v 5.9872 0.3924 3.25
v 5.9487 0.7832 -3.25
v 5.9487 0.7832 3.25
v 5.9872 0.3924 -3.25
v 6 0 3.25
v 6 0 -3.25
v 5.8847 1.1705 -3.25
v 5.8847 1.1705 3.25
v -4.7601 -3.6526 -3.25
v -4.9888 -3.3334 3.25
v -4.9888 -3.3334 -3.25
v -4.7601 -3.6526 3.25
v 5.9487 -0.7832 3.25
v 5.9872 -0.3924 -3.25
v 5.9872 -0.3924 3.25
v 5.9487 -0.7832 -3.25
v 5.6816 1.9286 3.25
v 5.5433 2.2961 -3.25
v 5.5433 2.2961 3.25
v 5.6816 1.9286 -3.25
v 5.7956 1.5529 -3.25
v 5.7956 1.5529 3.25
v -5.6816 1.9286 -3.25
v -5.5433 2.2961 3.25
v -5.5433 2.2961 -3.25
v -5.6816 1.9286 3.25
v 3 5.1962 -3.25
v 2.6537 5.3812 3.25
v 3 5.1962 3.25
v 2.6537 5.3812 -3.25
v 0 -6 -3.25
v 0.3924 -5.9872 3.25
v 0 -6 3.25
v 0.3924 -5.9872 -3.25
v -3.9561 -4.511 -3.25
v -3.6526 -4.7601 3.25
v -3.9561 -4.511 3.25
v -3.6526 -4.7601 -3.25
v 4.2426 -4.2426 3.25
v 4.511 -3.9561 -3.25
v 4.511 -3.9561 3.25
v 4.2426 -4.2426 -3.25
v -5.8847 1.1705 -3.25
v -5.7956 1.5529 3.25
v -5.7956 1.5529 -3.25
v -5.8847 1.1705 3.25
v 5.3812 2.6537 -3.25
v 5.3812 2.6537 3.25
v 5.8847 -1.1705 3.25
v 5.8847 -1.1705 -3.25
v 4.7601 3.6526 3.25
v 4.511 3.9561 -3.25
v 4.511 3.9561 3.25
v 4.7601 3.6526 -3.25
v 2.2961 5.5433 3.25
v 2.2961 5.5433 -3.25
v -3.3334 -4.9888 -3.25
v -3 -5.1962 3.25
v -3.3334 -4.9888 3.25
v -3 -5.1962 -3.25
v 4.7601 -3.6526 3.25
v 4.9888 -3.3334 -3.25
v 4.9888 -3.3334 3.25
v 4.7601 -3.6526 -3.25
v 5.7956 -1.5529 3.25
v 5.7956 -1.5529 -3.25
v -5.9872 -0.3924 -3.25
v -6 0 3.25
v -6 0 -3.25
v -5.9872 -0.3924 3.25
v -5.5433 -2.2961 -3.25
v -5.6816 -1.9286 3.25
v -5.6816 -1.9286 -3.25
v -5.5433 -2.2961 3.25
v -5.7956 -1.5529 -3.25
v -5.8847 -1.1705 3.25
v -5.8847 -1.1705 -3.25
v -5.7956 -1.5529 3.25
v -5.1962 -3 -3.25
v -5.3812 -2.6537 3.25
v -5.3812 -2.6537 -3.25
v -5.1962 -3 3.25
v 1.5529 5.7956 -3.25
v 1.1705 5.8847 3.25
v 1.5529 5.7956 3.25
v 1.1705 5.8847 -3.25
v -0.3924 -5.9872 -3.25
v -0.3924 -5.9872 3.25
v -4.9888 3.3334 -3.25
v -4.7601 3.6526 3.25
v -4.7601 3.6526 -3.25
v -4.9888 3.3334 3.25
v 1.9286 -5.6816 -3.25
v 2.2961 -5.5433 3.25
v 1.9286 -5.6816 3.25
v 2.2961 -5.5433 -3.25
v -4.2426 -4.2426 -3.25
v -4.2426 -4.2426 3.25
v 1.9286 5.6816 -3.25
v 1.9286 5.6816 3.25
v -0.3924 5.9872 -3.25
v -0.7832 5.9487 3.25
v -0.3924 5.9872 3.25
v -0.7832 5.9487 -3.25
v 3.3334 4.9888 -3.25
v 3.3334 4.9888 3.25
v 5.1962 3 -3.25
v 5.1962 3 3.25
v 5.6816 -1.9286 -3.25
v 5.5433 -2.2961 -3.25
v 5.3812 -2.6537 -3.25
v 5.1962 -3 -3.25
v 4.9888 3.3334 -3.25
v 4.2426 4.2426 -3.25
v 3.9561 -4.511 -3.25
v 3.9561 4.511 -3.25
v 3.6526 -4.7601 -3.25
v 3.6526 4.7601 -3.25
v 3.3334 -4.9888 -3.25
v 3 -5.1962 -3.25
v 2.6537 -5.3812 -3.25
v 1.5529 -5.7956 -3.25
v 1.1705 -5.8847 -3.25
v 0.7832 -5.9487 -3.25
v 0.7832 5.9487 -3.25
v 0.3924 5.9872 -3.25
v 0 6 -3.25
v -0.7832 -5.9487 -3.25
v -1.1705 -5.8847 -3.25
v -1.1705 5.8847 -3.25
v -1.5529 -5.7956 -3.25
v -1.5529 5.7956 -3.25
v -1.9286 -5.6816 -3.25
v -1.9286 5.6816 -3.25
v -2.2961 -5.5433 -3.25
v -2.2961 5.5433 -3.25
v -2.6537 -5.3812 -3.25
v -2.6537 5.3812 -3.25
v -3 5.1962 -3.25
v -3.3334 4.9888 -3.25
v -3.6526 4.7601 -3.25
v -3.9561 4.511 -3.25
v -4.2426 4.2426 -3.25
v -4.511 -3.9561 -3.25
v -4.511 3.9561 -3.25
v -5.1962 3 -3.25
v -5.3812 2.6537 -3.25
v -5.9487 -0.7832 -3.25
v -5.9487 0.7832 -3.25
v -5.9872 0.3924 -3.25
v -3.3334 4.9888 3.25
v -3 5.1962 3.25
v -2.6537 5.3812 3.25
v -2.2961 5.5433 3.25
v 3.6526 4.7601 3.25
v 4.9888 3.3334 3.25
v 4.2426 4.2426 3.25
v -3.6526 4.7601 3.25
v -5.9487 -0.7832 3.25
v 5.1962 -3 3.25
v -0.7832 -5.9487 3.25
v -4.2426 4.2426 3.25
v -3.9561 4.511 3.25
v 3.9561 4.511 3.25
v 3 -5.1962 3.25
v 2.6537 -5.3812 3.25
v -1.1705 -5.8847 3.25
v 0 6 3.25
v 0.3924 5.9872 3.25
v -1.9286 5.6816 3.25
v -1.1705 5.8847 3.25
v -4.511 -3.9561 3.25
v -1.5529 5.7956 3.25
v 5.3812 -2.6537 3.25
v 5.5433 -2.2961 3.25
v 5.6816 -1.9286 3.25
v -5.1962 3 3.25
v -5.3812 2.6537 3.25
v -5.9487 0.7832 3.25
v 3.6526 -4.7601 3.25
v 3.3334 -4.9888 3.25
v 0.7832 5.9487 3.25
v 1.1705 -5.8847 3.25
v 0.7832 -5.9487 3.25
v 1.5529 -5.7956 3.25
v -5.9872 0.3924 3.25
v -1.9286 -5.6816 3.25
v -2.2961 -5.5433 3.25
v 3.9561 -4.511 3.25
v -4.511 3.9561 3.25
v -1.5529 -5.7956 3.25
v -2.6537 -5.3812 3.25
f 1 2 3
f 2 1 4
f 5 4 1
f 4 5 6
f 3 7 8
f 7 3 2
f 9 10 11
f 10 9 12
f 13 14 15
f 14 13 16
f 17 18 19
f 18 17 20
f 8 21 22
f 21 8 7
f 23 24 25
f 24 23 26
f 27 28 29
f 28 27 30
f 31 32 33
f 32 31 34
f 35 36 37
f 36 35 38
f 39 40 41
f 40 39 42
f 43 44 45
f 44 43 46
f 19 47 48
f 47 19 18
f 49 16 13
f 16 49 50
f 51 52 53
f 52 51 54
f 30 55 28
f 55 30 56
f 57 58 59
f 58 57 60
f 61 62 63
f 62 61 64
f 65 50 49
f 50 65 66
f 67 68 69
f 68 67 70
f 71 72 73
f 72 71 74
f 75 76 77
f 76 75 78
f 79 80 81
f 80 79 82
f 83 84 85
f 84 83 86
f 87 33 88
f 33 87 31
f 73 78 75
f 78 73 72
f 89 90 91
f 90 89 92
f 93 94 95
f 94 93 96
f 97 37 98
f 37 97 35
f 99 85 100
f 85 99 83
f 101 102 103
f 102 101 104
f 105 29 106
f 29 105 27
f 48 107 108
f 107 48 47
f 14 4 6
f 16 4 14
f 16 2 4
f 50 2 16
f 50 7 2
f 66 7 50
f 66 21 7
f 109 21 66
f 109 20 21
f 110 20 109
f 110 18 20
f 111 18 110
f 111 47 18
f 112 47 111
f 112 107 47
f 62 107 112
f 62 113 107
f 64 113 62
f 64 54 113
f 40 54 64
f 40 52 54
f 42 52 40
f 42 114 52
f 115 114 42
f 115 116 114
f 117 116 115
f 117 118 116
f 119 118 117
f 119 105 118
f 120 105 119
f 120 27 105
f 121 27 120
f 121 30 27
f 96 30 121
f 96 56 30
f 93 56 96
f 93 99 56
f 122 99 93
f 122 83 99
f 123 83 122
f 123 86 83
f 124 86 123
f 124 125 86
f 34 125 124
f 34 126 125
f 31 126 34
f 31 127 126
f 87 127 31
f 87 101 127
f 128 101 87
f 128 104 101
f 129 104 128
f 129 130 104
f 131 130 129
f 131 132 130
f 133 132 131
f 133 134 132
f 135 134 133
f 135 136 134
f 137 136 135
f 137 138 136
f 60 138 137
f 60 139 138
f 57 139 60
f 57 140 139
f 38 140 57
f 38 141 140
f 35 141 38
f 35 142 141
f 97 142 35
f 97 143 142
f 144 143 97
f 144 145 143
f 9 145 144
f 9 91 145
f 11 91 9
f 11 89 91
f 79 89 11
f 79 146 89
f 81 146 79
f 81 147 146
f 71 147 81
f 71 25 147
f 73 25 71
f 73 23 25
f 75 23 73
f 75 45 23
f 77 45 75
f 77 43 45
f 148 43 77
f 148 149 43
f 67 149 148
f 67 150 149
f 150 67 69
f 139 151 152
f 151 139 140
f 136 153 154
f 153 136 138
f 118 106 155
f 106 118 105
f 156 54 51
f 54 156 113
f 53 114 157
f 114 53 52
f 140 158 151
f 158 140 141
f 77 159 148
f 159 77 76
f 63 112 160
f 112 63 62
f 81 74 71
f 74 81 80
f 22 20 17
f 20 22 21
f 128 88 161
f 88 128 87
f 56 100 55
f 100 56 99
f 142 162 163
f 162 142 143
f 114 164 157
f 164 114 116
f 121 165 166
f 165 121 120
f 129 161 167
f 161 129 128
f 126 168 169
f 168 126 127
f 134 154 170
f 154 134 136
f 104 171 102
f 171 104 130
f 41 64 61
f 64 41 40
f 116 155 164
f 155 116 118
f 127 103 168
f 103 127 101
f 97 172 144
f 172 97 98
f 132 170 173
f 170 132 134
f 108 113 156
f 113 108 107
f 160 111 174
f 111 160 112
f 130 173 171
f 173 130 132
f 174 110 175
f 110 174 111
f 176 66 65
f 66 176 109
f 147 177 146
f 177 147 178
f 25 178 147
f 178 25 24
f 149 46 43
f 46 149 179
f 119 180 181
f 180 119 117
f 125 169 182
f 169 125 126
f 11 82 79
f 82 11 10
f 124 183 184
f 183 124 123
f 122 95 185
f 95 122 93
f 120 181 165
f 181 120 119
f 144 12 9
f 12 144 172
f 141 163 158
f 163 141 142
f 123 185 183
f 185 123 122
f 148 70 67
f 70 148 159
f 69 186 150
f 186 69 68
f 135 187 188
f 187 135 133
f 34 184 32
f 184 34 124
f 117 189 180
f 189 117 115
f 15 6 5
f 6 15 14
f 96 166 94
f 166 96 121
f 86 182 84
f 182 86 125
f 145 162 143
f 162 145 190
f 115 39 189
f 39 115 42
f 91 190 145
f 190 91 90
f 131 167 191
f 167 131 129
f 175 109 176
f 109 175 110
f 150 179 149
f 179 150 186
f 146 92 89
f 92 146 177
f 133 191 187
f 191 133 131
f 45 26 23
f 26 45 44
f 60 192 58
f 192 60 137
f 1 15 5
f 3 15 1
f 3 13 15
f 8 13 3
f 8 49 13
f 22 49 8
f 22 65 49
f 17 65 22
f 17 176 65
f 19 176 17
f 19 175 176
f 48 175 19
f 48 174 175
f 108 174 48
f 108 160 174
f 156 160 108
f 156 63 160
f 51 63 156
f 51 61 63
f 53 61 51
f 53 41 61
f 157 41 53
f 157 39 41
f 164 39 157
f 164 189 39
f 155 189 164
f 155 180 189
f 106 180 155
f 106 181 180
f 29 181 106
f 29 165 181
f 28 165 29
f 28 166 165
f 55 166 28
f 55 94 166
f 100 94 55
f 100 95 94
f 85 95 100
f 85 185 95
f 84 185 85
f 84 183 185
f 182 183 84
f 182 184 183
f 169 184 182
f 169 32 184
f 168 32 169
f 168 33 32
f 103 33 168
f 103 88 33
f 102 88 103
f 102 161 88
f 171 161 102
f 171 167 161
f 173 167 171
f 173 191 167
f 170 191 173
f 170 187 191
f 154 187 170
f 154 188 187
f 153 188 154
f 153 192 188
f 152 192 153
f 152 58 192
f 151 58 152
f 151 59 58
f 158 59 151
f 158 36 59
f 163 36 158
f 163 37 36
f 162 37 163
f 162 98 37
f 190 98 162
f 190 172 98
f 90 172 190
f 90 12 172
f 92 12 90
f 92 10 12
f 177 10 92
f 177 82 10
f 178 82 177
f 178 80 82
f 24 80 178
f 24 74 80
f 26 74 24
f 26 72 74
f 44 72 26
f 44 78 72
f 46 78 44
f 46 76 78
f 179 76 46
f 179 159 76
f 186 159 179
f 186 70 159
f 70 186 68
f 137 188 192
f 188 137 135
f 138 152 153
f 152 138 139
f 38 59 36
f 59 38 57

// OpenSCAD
$fn = 96;

// Target: potentiometer knob envelope ~ [12, 12, 6.5, 1.0]
body_width  = 12;
body_depth  = 12;
body_height = 6.5;
corner_radius_or_rounding = 1.0;

// Overlap to guarantee one connected solid (1–2mm as required)
overlap = 1.0;

// Knob proportions (short cylindrical knob)
knob_d = min(body_width, body_depth);     // 12
knob_r = knob_d/2;                        // 6
knob_h = body_height;                     // 6.5

// Subtle top cap and pointer ridge (kept within 12x12 footprint)
cap_h = 0.8;
cap_r = knob_r - 0.6;

pointer_w   = 2.0;
pointer_len = knob_r - 1.0;
pointer_h   = 0.9;

module potentiometer() {
    union() {
        // Main cylindrical knob (centered)
        cylinder(r=knob_r, h=knob_h, center=true);

        // Slightly rounded top cap (overlaps into knob by 'overlap')
        translate([0, 0, knob_h/2 - cap_h/2 - overlap/2])
            cylinder(r=cap_r, h=cap_h + overlap, center=true);

        // Small pointer ridge on the top face (overlaps into knob by 'overlap')
        translate([0,
                   knob_r - pointer_len/2 - 0.6,
                   knob_h/2 - pointer_h/2 - overlap/2])
            cube([pointer_w, pointer_len, pointer_h + overlap], center=true);
    }
}

// Missing part added: potentiometer (as a single connected solid)
potentiometer();
